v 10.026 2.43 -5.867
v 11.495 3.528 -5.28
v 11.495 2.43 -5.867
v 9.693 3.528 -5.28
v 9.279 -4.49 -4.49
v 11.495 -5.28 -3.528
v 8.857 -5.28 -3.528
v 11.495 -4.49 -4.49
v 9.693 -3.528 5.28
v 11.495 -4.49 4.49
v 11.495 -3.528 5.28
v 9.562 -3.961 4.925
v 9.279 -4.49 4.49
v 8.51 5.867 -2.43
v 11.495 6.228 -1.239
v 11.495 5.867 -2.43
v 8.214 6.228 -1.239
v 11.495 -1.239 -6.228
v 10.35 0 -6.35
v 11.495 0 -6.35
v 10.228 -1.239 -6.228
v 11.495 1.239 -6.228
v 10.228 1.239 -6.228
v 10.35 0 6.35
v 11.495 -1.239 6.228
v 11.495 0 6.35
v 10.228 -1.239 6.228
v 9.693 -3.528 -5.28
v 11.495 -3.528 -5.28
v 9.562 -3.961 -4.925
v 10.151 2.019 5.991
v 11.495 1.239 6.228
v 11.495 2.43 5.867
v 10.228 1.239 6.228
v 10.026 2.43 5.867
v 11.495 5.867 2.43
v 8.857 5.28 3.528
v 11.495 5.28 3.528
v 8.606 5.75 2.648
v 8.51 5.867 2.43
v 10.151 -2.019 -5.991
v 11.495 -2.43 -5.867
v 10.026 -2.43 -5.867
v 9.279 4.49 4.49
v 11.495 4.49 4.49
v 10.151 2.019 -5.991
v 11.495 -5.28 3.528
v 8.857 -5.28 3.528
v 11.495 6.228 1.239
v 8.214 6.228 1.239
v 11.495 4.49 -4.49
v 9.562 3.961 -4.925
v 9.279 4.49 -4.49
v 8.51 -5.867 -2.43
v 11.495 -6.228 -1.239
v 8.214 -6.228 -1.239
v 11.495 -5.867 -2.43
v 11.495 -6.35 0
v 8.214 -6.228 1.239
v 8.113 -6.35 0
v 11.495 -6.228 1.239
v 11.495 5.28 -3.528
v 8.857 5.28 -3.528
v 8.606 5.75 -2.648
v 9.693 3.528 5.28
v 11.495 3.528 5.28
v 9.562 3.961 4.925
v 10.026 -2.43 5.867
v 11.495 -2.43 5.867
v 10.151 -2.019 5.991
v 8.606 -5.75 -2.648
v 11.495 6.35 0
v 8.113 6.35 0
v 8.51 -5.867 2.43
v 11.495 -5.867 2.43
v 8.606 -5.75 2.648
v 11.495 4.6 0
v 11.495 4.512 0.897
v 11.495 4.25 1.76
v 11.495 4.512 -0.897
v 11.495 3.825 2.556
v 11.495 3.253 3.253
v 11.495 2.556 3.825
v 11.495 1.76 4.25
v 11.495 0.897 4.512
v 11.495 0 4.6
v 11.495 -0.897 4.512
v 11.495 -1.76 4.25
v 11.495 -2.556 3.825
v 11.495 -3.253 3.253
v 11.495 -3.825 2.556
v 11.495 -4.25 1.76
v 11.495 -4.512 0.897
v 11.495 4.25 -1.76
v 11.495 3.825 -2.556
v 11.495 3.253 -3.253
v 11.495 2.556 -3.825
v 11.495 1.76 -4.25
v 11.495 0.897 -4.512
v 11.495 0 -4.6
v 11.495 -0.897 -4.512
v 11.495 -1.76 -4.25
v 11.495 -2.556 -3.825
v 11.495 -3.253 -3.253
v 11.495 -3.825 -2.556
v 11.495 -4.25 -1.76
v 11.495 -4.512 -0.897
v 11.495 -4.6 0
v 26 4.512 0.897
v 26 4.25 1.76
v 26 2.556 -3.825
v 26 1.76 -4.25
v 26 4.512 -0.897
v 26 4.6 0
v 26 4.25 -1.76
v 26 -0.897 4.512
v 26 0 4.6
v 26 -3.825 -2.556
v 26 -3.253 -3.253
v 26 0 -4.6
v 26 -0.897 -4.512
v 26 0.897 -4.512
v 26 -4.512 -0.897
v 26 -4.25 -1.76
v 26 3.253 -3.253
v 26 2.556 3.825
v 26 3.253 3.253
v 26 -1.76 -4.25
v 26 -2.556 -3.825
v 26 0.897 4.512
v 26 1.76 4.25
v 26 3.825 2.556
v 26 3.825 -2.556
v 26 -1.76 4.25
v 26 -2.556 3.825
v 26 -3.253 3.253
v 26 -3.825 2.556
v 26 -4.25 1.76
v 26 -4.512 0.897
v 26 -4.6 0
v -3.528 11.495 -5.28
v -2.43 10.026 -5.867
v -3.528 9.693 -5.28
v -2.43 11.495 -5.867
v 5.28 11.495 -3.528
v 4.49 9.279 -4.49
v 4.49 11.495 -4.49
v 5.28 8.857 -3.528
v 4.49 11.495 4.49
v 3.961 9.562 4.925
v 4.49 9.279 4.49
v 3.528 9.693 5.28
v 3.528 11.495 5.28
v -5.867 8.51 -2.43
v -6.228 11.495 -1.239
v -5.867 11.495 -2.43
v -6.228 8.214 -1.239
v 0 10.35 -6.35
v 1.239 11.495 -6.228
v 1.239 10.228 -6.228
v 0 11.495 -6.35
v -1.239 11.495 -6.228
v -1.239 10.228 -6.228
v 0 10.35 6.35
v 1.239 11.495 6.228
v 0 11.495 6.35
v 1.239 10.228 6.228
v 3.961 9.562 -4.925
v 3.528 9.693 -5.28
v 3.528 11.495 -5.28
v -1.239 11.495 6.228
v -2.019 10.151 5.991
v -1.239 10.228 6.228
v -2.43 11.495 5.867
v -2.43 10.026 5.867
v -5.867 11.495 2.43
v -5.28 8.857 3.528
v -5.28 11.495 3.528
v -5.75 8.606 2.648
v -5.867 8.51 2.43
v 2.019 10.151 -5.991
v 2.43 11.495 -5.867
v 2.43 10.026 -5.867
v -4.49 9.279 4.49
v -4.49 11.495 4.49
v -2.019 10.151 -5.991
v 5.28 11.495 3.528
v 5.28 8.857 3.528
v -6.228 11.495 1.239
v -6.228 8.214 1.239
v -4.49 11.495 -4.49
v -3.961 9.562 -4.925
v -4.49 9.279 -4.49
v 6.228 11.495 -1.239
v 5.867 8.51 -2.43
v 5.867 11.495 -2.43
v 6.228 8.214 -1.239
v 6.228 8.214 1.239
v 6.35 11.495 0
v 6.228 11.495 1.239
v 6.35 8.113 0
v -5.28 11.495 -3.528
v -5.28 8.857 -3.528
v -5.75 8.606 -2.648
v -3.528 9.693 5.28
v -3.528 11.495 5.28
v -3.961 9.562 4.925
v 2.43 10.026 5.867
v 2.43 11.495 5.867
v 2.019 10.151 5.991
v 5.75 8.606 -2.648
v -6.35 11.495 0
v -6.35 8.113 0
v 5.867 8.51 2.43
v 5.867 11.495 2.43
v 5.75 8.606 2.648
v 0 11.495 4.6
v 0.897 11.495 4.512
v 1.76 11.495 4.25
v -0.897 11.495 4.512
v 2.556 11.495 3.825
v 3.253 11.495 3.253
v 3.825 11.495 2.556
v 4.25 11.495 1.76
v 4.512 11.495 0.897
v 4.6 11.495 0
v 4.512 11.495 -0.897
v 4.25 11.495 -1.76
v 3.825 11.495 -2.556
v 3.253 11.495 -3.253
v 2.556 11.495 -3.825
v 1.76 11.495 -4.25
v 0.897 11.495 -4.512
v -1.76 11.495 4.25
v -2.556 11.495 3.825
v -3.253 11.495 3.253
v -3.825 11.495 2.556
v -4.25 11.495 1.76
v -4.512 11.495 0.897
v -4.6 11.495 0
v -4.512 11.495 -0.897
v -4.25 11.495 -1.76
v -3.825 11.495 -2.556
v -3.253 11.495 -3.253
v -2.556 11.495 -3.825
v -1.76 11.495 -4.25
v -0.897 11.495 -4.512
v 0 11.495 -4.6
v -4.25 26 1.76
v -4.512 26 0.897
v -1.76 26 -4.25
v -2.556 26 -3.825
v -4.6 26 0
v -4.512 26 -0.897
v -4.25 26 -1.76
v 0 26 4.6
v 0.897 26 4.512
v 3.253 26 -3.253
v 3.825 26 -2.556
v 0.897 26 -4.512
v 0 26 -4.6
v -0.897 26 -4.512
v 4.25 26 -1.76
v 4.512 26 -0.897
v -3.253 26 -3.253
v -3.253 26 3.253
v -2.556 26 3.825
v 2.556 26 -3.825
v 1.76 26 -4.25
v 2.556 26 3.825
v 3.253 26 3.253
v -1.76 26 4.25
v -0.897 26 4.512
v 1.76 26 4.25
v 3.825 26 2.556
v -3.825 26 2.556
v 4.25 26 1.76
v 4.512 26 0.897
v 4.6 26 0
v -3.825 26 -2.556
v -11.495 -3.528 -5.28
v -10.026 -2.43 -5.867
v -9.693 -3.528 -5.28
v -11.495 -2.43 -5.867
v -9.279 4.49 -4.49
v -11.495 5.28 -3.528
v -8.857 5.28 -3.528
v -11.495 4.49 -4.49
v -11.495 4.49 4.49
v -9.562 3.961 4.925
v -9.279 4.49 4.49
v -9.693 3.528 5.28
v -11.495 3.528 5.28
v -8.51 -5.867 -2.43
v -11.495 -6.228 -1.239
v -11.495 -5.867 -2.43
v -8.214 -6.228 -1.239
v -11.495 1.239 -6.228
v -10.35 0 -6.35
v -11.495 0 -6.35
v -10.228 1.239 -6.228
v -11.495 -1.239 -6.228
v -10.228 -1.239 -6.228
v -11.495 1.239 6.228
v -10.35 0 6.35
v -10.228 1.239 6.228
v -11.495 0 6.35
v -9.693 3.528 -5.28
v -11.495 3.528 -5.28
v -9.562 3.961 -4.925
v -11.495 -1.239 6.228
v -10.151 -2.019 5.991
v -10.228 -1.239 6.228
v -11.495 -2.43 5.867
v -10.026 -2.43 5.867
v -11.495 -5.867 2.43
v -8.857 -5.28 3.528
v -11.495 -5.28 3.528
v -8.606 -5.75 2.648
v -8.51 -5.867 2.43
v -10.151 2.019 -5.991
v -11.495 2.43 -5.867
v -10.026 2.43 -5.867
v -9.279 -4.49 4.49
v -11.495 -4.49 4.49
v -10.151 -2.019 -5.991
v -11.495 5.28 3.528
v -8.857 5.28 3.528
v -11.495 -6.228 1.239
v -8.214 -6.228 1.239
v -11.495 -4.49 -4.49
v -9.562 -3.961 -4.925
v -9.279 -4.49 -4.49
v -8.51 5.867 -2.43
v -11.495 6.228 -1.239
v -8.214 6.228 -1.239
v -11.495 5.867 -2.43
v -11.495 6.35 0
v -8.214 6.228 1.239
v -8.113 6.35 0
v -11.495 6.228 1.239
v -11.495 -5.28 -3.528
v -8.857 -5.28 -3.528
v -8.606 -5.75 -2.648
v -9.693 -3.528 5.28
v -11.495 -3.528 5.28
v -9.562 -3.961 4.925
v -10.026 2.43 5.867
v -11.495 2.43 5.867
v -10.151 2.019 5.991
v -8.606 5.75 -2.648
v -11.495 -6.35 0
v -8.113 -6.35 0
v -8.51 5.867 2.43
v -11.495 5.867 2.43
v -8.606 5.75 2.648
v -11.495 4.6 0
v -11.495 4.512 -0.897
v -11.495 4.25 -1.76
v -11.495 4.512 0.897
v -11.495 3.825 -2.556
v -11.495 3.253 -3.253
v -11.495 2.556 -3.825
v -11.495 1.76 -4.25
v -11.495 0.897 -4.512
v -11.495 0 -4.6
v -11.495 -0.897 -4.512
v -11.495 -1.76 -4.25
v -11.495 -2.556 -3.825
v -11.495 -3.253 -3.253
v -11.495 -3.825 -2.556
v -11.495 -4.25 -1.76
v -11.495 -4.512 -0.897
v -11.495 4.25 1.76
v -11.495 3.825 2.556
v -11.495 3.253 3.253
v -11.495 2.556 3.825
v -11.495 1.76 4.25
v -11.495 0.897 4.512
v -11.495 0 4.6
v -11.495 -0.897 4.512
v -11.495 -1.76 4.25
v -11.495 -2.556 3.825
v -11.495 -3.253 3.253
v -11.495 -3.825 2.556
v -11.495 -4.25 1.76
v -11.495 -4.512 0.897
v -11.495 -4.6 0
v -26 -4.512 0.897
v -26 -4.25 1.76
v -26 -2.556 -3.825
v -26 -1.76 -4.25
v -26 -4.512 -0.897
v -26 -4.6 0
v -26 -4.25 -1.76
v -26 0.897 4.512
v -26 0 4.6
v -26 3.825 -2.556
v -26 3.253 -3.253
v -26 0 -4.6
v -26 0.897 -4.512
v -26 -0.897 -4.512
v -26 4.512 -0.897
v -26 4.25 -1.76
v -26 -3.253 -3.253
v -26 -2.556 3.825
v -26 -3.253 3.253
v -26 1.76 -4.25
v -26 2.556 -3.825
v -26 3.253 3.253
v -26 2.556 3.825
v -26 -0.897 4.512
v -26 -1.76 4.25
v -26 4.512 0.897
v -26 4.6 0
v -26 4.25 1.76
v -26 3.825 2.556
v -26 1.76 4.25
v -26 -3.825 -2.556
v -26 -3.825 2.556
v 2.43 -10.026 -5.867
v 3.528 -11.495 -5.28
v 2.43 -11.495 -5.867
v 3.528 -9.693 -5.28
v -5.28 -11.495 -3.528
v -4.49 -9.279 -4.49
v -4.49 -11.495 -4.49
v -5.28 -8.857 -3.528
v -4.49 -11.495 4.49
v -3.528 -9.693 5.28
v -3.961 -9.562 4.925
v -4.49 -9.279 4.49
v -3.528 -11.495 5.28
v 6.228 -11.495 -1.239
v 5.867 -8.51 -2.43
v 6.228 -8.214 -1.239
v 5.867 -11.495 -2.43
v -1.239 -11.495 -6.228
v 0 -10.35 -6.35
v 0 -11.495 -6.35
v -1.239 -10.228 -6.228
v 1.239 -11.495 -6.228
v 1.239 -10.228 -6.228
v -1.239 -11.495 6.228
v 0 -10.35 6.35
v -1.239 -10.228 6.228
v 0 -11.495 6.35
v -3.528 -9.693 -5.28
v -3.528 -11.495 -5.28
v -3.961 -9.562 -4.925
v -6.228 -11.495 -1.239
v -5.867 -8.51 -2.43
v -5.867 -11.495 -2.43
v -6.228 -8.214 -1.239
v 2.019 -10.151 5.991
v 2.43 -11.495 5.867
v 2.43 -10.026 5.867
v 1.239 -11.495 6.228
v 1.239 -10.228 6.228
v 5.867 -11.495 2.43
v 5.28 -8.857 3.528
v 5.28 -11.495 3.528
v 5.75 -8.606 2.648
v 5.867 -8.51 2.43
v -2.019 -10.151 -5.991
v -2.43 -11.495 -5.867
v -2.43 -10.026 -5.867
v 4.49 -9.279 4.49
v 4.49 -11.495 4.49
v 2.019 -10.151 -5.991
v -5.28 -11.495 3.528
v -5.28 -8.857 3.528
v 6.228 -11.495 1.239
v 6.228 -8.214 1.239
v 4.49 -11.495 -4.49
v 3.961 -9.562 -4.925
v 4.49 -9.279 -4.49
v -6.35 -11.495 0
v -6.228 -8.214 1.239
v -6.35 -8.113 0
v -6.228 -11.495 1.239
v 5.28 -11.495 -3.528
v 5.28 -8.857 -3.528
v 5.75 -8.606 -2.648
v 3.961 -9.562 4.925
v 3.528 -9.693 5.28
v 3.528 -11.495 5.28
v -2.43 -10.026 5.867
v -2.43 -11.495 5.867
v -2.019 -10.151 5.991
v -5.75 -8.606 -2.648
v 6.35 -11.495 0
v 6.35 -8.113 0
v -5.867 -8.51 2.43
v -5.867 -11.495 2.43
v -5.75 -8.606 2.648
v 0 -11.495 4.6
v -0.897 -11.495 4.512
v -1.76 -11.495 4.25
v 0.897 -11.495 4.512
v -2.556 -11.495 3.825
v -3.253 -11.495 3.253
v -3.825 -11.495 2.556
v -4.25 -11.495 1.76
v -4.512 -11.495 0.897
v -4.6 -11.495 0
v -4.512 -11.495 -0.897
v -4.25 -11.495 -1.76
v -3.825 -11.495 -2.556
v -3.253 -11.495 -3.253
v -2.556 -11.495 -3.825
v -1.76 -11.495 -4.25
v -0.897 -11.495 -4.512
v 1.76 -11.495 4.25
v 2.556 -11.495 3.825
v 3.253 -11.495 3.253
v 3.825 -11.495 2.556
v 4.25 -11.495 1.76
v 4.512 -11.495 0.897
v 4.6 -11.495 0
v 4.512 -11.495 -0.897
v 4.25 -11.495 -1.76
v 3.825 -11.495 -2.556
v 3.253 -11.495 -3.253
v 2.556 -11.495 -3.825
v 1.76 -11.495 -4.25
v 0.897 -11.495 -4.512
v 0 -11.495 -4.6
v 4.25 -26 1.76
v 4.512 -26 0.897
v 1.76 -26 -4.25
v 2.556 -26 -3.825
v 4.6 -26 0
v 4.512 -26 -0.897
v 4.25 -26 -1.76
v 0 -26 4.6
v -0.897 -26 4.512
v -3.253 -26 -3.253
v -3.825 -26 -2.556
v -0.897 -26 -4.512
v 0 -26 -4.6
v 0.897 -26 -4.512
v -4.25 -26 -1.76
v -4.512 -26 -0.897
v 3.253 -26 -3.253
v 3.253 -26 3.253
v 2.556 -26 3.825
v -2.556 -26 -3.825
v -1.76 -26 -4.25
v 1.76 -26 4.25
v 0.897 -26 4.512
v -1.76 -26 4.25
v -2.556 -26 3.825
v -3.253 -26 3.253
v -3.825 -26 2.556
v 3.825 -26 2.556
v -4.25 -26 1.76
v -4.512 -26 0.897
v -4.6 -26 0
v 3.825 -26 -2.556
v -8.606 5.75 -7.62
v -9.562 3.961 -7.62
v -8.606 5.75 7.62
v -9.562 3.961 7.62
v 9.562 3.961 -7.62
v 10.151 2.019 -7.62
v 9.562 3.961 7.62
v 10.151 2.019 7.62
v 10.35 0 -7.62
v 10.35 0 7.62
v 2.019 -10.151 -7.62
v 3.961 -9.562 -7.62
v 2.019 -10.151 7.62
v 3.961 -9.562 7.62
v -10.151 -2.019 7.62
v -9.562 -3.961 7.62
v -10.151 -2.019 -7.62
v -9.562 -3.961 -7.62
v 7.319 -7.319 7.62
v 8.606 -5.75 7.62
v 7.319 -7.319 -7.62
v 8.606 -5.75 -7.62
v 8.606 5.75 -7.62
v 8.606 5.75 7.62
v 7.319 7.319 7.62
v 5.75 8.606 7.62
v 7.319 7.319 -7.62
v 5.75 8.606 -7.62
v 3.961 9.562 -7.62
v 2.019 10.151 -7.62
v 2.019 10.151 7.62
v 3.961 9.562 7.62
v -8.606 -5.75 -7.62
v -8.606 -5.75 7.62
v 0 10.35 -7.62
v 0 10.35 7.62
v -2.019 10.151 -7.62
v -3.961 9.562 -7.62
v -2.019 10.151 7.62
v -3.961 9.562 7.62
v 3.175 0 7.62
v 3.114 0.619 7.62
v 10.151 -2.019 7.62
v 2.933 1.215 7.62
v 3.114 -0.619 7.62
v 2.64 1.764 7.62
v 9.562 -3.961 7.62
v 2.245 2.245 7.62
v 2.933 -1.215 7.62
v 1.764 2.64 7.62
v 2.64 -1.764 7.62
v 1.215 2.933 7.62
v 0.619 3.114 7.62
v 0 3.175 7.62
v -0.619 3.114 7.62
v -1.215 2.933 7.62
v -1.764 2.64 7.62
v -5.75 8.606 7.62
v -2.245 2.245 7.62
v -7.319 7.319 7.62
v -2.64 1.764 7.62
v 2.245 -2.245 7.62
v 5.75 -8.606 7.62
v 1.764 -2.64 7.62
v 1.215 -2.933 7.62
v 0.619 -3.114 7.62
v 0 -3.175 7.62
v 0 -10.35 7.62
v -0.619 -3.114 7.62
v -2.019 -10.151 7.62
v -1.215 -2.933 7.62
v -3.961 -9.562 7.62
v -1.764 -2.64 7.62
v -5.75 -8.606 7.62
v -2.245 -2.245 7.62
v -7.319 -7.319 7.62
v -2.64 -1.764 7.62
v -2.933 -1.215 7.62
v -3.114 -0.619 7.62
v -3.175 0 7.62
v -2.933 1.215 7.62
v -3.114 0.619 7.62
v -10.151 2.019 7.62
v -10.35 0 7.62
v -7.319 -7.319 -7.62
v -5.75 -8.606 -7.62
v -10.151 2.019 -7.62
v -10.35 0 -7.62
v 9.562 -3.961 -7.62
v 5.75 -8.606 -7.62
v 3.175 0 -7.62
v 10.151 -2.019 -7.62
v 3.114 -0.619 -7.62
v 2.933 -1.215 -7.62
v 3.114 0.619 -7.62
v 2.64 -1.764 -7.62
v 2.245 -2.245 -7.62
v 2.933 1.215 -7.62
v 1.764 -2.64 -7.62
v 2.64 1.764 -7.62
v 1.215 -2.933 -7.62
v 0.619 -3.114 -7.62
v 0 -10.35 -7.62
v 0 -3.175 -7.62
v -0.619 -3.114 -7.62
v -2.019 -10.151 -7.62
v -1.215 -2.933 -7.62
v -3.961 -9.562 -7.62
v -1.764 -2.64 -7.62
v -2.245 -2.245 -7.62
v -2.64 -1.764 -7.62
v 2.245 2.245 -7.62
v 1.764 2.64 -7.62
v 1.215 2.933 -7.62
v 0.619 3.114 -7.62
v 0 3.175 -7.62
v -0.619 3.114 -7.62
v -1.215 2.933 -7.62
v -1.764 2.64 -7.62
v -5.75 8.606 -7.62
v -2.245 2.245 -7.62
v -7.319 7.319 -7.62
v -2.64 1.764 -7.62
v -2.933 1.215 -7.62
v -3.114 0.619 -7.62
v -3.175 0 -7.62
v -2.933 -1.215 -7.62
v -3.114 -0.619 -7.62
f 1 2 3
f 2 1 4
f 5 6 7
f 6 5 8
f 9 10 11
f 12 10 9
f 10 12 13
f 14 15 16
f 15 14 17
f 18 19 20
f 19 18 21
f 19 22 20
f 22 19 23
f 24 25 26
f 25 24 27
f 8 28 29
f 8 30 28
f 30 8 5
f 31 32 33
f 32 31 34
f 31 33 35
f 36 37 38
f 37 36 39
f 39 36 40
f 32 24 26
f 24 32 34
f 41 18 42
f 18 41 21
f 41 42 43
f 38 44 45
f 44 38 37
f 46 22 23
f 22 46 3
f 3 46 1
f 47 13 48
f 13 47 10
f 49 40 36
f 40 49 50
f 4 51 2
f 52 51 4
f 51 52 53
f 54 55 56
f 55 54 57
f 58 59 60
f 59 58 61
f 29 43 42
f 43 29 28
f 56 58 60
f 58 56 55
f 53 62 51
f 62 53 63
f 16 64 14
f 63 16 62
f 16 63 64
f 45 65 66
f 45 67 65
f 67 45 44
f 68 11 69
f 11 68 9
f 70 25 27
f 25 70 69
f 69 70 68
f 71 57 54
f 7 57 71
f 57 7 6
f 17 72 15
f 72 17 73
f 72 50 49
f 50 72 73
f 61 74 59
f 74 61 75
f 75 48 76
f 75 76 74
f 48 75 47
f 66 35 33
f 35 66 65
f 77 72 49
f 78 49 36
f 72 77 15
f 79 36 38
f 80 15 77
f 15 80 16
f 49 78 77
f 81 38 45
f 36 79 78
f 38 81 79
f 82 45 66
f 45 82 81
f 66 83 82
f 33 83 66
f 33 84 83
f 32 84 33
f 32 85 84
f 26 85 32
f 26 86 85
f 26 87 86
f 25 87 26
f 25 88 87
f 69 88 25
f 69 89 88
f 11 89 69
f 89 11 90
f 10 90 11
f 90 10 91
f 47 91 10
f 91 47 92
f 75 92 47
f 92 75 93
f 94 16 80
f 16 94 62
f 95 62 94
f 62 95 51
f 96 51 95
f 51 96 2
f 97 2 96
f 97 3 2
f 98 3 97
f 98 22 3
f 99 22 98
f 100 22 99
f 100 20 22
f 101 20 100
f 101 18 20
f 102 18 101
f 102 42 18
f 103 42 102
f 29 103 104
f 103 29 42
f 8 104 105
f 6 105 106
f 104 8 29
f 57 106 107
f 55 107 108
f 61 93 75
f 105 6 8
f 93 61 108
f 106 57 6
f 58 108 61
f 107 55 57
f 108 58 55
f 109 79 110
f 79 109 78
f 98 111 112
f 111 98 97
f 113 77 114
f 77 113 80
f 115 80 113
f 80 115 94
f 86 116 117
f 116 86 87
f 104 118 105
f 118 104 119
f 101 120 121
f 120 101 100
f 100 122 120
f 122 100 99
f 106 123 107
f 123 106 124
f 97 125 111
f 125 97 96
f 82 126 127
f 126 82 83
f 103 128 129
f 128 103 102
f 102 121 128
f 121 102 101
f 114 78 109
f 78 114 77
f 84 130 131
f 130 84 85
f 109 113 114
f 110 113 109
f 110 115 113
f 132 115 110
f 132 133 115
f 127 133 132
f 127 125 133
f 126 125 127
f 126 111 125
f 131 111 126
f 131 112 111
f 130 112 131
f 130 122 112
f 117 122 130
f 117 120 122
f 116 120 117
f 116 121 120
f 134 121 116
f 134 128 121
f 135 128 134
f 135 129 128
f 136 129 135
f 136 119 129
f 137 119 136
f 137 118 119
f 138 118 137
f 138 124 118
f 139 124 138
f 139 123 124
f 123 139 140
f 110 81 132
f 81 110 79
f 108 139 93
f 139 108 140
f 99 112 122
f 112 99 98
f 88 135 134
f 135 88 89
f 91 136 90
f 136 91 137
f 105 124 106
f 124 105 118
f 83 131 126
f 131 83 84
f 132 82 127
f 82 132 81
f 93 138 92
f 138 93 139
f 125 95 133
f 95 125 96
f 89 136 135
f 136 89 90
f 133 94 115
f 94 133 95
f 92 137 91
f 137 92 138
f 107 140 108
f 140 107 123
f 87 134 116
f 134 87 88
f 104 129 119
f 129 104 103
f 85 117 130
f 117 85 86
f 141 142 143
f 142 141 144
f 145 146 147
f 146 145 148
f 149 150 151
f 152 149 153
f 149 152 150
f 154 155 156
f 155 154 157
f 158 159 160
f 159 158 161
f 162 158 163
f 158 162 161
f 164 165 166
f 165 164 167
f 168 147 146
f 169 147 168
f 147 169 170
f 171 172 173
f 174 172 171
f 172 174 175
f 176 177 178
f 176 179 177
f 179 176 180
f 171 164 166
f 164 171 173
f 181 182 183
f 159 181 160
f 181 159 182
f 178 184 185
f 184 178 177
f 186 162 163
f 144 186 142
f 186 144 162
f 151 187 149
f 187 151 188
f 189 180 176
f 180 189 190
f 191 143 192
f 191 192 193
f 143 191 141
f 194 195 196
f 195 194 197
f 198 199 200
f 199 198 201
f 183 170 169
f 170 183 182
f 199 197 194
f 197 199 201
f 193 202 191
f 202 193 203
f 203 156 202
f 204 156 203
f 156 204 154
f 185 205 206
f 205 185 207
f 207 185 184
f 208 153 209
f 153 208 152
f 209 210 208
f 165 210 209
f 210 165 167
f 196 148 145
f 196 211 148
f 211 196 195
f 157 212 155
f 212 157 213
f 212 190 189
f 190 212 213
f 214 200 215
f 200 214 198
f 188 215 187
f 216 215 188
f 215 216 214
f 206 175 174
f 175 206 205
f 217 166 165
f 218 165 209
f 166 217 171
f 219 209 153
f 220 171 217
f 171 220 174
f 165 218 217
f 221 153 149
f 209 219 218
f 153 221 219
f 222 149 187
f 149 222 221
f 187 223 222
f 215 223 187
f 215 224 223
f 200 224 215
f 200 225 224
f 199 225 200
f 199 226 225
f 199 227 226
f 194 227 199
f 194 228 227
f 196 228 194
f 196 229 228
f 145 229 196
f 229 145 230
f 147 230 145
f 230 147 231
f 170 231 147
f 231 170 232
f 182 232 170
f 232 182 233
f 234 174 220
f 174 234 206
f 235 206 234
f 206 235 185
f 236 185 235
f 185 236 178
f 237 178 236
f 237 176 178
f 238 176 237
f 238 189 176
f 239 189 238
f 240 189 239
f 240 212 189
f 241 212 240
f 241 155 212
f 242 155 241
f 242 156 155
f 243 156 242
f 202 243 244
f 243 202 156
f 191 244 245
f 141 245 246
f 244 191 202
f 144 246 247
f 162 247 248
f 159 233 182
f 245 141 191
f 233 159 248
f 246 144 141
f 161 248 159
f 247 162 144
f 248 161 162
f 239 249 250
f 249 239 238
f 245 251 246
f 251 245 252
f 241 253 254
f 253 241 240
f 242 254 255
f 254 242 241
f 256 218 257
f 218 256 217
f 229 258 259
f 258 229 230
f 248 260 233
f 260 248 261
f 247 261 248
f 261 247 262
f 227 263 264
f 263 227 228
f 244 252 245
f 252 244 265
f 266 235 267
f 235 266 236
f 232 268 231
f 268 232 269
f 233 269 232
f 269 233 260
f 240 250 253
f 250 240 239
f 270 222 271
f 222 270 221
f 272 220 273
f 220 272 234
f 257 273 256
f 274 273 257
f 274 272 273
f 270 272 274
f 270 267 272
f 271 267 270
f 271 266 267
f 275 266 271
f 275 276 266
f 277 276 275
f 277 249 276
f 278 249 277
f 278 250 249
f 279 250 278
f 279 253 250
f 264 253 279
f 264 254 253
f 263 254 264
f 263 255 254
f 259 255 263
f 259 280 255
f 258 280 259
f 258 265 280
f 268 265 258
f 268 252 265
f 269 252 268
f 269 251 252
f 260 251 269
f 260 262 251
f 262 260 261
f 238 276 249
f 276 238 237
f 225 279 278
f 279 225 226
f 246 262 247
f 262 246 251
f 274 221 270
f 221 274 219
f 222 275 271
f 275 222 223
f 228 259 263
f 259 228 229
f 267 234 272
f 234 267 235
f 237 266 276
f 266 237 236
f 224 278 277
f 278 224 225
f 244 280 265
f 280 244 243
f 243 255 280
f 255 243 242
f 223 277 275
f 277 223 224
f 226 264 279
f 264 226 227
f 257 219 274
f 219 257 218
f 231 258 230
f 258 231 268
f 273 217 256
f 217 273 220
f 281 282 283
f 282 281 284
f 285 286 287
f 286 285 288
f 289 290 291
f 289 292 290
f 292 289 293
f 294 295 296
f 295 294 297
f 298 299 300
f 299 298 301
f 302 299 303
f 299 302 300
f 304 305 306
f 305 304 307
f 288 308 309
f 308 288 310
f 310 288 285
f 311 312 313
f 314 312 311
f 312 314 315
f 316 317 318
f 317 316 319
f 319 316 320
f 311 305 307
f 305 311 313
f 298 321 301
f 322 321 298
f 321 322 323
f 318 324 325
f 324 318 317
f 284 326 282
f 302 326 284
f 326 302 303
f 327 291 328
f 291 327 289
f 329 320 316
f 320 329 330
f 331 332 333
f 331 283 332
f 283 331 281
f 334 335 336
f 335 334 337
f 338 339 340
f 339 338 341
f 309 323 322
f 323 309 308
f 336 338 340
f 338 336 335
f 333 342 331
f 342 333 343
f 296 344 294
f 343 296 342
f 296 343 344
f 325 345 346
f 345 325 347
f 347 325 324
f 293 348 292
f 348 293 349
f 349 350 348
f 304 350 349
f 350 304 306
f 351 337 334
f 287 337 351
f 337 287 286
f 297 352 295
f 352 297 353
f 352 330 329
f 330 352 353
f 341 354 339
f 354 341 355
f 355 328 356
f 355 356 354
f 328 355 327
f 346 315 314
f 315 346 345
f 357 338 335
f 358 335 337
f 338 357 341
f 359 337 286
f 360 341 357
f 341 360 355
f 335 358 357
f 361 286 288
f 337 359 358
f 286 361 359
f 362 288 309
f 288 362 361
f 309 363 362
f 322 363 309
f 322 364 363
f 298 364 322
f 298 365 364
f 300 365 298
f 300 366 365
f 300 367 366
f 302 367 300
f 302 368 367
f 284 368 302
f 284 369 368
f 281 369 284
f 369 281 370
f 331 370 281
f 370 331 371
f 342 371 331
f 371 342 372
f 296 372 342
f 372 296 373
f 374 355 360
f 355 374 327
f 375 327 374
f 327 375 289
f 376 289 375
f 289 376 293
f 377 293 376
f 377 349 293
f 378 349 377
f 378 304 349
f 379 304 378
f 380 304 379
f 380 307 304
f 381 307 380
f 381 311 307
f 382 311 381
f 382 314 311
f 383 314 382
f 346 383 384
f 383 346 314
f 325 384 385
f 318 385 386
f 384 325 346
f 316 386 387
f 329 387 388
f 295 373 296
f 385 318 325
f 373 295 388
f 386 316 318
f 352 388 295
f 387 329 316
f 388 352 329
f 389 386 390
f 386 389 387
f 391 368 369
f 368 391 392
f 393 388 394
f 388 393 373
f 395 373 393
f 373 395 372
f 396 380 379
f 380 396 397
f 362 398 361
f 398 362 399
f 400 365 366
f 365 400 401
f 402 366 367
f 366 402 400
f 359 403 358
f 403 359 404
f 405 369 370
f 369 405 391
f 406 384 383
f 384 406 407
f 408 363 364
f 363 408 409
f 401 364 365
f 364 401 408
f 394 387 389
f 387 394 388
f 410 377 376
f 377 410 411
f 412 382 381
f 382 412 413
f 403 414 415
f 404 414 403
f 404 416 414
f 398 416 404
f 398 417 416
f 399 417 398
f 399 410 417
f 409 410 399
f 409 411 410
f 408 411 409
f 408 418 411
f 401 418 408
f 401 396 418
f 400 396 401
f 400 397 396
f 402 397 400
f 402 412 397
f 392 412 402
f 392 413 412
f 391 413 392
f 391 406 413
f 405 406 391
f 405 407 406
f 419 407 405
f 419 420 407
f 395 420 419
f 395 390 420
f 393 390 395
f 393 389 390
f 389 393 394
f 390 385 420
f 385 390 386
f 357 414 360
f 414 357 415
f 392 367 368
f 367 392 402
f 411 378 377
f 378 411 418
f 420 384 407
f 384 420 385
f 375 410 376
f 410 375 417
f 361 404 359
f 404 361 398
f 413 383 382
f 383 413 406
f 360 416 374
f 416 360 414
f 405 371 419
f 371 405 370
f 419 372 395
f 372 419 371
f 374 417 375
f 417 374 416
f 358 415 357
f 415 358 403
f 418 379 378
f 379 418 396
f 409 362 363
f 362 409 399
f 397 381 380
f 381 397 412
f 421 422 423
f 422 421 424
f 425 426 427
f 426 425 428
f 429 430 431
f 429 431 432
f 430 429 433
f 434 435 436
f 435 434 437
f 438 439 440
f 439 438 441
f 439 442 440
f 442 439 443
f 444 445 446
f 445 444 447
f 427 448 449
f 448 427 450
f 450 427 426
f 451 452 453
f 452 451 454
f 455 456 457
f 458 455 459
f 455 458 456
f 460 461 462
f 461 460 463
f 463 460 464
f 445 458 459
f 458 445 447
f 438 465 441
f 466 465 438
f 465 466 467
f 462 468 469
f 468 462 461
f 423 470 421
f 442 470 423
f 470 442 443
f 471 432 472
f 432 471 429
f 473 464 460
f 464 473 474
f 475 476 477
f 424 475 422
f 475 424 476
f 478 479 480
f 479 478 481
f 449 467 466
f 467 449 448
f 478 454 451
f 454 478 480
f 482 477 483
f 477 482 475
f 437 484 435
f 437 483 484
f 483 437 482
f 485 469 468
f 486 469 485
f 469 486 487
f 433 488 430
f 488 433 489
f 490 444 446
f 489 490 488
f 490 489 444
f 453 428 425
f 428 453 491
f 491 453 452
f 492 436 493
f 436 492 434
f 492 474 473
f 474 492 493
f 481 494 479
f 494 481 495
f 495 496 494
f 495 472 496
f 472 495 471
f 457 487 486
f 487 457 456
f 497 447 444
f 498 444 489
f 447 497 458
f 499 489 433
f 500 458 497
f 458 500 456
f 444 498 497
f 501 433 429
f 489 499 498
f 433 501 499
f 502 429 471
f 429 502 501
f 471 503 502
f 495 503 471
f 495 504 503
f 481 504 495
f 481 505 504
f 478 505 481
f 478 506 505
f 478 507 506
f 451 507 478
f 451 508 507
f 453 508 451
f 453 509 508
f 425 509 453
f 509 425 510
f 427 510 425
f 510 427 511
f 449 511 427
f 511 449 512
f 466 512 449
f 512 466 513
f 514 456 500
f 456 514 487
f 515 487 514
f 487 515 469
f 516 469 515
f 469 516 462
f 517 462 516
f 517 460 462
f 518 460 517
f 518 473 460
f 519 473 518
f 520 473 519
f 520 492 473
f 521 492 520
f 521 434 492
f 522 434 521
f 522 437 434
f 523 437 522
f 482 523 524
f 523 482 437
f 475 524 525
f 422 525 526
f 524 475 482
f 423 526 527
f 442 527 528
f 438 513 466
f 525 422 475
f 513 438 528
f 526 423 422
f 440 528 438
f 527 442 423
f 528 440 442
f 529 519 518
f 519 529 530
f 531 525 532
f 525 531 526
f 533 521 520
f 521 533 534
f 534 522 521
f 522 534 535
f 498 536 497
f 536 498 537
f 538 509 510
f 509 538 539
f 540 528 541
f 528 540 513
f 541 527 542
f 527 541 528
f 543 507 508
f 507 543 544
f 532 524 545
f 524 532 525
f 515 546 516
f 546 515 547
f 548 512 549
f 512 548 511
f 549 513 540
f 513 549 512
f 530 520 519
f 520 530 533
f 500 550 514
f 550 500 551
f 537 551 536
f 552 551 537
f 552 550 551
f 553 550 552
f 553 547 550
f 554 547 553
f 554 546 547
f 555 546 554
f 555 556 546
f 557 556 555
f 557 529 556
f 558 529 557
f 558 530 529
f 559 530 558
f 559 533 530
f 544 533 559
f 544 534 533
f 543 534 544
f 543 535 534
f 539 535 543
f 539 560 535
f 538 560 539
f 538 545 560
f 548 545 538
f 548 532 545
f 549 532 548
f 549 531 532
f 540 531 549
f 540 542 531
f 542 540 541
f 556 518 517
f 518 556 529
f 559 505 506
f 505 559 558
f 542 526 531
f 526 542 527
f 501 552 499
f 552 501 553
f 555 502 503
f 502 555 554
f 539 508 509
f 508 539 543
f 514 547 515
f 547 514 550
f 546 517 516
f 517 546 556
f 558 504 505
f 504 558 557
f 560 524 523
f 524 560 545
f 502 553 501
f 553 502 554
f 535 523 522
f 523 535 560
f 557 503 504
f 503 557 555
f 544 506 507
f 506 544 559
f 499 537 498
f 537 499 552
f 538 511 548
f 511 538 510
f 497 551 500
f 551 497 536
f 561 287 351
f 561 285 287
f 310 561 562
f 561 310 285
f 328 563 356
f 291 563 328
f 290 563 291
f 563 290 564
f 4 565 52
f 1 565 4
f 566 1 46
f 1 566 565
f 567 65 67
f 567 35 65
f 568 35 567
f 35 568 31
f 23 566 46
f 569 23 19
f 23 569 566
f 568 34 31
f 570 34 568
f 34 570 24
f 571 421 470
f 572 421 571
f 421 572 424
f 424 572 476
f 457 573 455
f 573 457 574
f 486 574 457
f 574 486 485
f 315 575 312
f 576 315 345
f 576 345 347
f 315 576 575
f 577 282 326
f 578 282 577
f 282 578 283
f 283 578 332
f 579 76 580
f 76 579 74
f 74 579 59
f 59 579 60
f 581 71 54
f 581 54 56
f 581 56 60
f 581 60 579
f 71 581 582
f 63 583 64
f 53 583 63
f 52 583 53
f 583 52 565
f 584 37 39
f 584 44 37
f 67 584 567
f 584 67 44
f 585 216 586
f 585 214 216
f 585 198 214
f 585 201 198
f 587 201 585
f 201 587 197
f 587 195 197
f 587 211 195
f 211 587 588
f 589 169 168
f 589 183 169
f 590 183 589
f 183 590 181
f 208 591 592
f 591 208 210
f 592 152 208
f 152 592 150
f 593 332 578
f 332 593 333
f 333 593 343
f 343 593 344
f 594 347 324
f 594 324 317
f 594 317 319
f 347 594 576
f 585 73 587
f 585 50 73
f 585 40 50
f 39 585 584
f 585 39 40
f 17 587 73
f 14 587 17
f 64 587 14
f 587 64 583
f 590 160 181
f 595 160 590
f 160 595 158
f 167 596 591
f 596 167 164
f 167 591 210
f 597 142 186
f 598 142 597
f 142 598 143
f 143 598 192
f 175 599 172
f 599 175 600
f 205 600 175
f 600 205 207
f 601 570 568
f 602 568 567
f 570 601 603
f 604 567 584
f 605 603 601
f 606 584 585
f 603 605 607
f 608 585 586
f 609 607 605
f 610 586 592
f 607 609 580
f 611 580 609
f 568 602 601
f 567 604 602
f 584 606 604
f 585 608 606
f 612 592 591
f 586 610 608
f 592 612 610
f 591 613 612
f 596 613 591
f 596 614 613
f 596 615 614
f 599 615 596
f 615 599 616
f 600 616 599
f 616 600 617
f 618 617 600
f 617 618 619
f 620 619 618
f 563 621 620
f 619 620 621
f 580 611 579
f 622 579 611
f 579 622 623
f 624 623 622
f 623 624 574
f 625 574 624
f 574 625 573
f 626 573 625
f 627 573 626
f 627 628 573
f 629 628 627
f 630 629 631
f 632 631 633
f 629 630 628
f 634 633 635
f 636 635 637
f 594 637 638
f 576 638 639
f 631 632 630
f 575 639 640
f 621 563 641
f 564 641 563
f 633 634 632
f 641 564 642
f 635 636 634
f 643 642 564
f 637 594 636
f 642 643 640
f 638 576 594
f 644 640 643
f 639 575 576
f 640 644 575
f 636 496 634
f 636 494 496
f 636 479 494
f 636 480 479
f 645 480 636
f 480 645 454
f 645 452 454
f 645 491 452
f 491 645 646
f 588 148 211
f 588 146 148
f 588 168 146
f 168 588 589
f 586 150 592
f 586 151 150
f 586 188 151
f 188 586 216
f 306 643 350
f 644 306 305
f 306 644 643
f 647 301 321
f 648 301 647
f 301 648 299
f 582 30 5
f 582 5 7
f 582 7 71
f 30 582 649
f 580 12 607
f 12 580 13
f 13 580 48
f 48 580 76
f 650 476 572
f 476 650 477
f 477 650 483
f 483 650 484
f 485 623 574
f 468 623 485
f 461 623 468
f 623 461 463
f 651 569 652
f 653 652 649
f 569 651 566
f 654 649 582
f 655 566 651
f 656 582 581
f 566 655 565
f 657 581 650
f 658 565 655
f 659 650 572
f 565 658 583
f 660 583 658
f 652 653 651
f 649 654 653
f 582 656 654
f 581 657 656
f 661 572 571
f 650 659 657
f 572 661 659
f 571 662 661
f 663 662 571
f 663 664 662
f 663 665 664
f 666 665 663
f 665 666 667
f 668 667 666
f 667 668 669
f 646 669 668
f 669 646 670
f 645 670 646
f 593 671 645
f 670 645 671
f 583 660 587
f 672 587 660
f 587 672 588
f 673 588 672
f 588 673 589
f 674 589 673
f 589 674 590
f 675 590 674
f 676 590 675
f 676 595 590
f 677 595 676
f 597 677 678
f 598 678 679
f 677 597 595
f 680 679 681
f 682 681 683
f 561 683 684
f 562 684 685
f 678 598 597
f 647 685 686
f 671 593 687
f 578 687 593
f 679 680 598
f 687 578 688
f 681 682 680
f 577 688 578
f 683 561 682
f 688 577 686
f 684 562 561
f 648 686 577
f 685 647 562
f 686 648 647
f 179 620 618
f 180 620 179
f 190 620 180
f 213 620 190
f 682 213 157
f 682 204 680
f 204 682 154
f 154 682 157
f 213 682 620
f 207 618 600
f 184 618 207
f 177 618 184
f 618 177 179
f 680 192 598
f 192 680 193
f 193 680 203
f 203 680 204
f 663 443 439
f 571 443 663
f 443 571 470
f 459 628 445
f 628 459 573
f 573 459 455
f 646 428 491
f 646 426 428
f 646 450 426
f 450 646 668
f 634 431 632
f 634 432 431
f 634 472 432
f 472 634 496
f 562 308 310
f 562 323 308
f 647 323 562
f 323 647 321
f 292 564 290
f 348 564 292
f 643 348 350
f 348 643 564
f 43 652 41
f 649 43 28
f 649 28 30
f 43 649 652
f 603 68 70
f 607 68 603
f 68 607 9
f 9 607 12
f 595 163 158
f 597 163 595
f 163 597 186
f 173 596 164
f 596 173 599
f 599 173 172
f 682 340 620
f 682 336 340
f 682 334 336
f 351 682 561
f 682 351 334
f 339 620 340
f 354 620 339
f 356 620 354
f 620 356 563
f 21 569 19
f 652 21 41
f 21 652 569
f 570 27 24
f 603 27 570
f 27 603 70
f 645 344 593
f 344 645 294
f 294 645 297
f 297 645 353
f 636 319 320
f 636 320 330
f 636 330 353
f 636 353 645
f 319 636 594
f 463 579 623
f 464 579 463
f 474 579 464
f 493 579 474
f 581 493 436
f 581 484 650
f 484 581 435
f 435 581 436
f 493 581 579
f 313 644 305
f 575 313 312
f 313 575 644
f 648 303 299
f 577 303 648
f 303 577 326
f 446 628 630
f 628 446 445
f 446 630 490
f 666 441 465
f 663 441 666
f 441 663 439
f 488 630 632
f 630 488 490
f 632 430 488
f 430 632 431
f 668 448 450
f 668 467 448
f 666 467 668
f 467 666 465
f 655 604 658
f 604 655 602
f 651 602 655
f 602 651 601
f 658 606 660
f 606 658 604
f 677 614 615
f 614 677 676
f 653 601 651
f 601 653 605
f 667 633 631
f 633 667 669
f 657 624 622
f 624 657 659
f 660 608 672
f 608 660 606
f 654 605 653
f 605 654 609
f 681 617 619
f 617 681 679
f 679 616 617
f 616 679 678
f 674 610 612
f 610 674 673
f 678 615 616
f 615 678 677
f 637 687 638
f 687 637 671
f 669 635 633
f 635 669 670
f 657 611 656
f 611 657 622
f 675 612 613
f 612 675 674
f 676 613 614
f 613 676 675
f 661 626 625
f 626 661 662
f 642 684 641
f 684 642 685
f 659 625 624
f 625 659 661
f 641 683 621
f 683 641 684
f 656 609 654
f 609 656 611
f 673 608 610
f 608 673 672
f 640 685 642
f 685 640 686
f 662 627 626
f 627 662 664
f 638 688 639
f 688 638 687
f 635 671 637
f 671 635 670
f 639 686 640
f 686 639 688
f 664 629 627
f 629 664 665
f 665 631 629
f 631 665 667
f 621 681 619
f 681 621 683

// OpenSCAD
$fn = 32;

// ----------------------------------------------------------------------
// Cardan cross: 52 mm span, 12.7 mm trunnions
// ----------------------------------------------------------------------

// --- parameters (mm) ---
journal_d = 12.7;         // trunnion diameter
arm_len = 26;             // trunnion length from the centre
step_r = 4.32;            // step position from the centre
step_d = 9.2;             // journal diameter after the step
hub_d = 20.7;             // hub diameter
hub_h = 15.24;            // hub height
bore_d = 6.35;            // hub bore

difference() {
  union() {
    /* hub along the joint axis */
    cylinder(h = hub_h, d = hub_d, center = true);
    for (a = [0 : 90 : 270]) rotate([0, 0, a]) {
      /* trunnion, sunk into the hub */
      translate([hub_d / 4, 0, 0]) rotate([0, 90, 0]) cylinder(h = step_r + 2, d = journal_d);
      /* stepped journal out to the tip */
      translate([step_r - 0.5, 0, 0]) rotate([0, 90, 0]) cylinder(h = arm_len + 0.5 - step_r, d = step_d);
    }
  }
  /* lubrication bore through the hub, 2.5 mm clear on both sides */
  translate([0, 0, -hub_h / 2 - 2.5]) cylinder(h = hub_h + 5, d = bore_d);
}
